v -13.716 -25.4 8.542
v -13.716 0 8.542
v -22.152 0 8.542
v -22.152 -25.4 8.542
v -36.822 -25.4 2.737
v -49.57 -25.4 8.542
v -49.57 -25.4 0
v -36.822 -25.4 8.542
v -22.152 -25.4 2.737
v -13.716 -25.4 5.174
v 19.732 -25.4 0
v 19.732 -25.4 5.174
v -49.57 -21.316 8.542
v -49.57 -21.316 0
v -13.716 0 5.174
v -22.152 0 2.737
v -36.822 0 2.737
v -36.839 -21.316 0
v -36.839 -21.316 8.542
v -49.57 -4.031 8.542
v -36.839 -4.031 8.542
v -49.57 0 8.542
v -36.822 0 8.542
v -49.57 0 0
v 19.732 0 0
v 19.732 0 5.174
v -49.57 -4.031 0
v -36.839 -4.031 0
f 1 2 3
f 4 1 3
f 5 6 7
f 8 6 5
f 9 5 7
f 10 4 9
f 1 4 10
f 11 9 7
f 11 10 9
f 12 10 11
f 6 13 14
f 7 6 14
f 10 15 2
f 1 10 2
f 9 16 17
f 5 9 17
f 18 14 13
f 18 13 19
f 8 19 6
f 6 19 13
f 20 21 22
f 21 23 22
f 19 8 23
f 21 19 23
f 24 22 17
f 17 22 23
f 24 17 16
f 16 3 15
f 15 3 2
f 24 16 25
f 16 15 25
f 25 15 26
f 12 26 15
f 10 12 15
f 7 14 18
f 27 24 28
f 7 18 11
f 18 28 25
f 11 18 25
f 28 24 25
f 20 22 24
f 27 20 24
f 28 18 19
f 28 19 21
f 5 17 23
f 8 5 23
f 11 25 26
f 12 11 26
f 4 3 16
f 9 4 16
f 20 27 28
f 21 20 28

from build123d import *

# Parameters (mm, degrees)
F1_DEPTH = 25.4
F2_W     = 16.138606
F2_H     = 17.284541
F3_DEPTH = 8.543421


with BuildPart() as f1:
    # F0 (on Front) → F1 (new body)
    with BuildSketch(Plane.XZ):
        Polygon((-36.821757, 8.542421), (-49.570106, 8.542421), (-49.570106, 0), (19.731788, 0), (19.731788, 5.173579), (-13.715999, 5.173579), (-13.715999, 8.542421), (-22.151655, 8.542421), (-22.151655, 2.737268), (-36.821757, 2.737268), align=None)
    extrude(amount=F1_DEPTH)

    # F2 (on Top) → F3 (cut, through all)
    with BuildSketch(Plane.XY):
        with Locations((-44.908296, -12.673702)):
            Rectangle(F2_W, F2_H)
    extrude(amount=F3_DEPTH, mode=Mode.SUBTRACT)


solid = f1.part
